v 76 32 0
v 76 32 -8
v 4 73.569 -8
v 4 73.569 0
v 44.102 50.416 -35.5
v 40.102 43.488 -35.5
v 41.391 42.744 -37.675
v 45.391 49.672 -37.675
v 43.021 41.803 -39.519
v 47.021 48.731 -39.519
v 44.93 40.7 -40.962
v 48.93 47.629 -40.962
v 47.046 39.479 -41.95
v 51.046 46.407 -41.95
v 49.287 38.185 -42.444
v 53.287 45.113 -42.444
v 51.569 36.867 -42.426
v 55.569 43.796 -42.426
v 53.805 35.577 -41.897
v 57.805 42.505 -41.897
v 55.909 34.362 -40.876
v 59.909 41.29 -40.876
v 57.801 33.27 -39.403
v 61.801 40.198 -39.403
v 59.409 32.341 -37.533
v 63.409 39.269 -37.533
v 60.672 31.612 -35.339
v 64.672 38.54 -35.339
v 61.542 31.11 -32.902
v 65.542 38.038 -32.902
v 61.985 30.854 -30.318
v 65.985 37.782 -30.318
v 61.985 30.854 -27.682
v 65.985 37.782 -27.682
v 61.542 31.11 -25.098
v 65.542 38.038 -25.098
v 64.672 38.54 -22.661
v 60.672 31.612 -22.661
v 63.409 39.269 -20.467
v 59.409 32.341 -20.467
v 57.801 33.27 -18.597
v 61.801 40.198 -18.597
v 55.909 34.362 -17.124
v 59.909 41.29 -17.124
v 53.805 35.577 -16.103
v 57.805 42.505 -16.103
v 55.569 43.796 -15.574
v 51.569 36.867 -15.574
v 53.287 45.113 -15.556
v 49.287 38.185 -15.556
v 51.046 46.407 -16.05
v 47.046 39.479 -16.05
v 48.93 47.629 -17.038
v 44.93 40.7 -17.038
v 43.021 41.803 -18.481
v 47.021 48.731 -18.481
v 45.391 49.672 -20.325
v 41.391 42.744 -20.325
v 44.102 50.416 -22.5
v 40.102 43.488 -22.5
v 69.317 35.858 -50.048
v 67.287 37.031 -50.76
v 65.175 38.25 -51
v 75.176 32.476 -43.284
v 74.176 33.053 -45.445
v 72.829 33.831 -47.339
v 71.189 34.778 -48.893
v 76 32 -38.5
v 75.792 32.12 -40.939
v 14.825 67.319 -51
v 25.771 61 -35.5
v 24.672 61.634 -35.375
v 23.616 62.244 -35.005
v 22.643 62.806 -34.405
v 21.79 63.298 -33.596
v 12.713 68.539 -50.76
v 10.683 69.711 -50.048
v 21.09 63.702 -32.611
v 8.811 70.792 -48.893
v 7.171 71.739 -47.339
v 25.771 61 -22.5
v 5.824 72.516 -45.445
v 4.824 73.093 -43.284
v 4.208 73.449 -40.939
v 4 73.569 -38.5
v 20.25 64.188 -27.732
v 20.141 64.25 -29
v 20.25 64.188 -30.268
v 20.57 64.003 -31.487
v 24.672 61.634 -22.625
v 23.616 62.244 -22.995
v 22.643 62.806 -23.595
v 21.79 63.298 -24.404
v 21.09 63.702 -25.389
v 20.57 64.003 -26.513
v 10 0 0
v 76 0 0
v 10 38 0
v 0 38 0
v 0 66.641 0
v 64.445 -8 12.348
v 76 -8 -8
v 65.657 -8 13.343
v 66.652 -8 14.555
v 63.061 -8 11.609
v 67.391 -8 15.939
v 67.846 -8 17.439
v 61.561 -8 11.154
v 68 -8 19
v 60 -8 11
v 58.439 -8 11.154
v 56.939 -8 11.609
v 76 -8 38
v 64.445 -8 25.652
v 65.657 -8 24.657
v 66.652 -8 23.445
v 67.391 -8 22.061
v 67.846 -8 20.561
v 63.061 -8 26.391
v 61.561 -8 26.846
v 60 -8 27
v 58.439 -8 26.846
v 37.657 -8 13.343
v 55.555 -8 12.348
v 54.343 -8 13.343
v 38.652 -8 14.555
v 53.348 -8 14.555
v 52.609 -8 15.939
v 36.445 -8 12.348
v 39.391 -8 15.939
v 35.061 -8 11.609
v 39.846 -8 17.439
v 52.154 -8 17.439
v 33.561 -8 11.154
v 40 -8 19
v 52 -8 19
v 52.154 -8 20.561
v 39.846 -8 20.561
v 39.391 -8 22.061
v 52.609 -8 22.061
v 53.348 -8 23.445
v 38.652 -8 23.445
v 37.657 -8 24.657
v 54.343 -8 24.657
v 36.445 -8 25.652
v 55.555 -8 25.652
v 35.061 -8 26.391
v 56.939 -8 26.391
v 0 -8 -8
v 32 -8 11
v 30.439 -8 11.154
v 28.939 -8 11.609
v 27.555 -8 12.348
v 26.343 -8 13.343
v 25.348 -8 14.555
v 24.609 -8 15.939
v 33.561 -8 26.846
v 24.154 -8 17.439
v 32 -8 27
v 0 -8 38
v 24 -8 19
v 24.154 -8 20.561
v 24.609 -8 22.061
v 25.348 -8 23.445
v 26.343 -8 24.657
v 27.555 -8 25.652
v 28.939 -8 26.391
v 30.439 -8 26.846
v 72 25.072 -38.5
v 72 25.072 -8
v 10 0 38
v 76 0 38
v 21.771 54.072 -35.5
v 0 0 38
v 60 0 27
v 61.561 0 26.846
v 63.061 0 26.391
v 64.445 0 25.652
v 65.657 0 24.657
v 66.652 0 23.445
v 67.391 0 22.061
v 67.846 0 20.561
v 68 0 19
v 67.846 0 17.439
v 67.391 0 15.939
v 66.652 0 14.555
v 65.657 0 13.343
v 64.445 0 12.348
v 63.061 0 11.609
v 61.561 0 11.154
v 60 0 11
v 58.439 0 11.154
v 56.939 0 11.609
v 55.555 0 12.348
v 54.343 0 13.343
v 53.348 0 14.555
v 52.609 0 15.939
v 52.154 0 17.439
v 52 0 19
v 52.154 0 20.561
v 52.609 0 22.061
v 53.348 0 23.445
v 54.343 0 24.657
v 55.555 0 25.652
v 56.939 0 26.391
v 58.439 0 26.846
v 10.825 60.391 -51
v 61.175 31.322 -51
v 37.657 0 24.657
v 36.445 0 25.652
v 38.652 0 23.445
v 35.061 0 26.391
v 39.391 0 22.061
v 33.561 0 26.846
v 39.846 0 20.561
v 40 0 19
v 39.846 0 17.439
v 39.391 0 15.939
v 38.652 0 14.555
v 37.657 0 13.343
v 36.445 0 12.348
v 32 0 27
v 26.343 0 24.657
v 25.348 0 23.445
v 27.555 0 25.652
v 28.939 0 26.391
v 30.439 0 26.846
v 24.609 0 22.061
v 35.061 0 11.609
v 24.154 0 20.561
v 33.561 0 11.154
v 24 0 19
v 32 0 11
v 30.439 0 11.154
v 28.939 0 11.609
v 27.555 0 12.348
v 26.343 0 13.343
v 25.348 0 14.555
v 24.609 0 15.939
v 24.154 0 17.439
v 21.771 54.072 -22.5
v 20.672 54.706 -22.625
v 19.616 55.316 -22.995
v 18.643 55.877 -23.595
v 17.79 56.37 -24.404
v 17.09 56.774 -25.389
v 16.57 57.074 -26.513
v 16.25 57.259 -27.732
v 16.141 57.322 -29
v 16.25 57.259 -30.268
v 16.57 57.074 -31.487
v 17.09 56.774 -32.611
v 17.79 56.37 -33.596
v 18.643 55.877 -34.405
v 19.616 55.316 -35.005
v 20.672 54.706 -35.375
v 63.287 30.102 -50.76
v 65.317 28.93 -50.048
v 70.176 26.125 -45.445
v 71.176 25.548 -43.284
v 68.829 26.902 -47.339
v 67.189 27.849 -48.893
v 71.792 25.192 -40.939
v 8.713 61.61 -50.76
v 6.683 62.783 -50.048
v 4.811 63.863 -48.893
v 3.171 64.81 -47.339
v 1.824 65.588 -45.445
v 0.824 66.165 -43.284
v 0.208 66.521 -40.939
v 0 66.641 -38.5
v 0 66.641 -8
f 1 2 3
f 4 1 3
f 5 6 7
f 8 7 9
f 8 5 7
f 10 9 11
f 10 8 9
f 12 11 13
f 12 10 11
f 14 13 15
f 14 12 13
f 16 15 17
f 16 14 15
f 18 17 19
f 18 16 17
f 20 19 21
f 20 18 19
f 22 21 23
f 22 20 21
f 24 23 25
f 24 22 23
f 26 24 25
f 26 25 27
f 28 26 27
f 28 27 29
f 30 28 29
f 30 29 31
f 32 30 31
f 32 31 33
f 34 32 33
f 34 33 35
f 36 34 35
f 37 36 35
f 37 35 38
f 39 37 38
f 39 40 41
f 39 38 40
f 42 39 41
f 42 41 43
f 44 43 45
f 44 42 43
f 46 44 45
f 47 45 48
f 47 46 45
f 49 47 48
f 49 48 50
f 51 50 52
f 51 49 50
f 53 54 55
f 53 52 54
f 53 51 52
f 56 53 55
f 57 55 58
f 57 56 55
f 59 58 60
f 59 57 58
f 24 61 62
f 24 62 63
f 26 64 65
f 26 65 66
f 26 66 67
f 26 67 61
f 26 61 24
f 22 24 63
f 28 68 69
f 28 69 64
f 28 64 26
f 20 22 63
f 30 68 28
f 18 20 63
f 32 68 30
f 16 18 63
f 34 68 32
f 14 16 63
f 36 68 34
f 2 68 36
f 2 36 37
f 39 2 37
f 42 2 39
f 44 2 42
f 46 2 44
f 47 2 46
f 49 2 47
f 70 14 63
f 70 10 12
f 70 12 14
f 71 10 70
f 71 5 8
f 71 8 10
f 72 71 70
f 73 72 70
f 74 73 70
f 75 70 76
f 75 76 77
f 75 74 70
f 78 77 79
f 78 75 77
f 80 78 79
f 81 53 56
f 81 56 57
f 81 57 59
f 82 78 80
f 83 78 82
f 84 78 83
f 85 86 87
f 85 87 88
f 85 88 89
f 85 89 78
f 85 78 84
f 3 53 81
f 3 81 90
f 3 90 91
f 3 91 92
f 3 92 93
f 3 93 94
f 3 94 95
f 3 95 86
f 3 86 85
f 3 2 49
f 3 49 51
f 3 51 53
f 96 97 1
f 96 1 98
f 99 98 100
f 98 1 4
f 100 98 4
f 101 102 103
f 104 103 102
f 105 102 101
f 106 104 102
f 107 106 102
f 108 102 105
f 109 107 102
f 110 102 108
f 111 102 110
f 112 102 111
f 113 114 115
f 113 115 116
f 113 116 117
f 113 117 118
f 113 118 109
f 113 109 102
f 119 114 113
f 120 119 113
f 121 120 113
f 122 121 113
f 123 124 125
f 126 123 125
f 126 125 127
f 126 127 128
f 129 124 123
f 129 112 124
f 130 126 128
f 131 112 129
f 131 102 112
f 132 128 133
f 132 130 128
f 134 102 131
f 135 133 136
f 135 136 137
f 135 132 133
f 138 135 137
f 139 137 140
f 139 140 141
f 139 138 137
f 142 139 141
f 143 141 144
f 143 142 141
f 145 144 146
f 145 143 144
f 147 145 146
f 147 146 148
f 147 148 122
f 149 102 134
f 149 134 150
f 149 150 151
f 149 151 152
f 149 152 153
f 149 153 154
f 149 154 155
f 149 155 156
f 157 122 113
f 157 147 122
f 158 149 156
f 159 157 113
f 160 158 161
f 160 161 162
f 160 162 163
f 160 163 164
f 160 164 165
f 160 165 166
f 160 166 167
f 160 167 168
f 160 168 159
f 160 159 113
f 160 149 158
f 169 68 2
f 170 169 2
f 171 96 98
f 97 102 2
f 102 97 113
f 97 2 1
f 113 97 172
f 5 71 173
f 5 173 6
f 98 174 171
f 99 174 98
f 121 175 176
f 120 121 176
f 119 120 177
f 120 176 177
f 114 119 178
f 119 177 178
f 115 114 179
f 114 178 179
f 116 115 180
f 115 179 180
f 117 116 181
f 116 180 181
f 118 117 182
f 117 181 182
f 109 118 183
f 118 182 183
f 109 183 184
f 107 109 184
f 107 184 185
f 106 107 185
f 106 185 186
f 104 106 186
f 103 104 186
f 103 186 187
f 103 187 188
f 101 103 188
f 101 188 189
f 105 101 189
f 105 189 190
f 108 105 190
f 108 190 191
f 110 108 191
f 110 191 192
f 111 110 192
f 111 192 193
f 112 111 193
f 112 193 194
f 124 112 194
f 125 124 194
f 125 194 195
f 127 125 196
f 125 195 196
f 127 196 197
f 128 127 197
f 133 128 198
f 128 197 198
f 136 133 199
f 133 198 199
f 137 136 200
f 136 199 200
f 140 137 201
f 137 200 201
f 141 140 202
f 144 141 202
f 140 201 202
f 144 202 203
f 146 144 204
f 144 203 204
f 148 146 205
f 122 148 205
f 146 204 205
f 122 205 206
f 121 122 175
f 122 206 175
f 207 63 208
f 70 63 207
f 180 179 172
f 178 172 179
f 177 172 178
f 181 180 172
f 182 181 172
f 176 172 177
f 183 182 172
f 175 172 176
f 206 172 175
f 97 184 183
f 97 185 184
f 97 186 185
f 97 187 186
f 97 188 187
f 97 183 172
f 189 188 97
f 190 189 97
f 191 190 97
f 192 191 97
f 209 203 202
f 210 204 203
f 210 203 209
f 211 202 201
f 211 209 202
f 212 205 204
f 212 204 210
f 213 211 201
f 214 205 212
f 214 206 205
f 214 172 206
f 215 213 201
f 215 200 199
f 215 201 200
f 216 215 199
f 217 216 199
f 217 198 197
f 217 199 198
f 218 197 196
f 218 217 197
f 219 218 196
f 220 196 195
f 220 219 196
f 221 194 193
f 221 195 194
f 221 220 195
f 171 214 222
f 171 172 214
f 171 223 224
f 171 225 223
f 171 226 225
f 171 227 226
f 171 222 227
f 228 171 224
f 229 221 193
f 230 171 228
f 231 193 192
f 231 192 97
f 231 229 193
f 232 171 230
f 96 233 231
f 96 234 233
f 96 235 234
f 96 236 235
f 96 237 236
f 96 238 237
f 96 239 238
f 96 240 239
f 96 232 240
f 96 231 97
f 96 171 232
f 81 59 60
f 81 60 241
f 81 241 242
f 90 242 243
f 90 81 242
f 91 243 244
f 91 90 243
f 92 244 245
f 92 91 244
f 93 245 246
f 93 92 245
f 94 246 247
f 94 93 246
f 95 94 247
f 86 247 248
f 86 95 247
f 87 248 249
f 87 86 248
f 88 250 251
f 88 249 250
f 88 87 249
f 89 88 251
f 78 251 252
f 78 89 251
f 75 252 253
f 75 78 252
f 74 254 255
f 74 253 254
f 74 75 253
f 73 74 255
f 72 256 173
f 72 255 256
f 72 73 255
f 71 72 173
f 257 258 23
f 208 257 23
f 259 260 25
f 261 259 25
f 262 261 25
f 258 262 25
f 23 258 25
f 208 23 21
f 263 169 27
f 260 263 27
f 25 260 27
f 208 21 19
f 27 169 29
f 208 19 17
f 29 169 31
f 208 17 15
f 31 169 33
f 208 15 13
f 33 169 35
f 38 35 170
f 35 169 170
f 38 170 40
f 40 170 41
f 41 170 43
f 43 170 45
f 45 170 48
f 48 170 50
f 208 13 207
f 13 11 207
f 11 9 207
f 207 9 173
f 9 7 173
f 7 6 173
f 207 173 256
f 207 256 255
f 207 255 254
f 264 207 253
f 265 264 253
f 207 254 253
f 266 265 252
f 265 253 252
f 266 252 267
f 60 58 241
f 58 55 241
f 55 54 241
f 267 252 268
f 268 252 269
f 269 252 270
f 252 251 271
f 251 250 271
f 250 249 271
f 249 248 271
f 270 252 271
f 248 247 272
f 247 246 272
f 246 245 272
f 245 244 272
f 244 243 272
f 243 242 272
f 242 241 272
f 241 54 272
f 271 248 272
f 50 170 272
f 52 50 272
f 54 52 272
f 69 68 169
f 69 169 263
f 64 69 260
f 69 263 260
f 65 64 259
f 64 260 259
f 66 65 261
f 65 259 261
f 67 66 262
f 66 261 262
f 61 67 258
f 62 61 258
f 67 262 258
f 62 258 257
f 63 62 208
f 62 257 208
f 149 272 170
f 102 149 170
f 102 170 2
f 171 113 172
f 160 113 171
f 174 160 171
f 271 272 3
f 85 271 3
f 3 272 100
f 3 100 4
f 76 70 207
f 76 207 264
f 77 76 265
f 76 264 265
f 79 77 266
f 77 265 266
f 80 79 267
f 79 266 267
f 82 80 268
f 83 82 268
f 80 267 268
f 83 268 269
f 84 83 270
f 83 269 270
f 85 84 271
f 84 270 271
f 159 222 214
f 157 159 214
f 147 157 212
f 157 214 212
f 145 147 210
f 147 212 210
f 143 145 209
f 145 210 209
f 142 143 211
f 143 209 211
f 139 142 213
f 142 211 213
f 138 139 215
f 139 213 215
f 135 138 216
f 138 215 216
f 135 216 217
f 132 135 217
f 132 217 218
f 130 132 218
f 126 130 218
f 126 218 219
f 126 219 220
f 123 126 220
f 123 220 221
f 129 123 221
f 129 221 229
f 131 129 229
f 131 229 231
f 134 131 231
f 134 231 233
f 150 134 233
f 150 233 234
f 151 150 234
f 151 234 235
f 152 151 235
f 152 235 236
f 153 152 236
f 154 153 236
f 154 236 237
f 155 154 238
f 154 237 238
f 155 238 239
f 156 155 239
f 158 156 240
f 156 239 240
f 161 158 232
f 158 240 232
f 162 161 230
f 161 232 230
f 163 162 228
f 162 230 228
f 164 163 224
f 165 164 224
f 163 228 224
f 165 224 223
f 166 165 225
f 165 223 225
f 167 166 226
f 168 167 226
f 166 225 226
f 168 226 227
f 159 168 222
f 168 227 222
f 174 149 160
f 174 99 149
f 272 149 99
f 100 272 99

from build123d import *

# Parameters (mm, degrees)
BASE_EXTRUDE_THIN_DEPTH = 76
BOSS_EXTRUDE1_START     = -8
BOSS_EXTRUDE1_DEPTH     = 8
SKETCH3_W               = 87.757240917
SKETCH3_H               = 51
BOSS_EXTRUDE2_DEPTH     = 8
CUT_EXTRUDE1_DEPTH      = 119.888876867
FILLET1_R               = 12.5
BOSS_EXTRUDE3_DEPTH     = 10
CUT_EXTRUDE2_DEPTH      = 101.073742043
SKETCH9_R               = 8
CUT_EXTRUDE3_DEPTH      = 118.428403891
LPATTERN2_COUNT         = 2
LPATTERN2_PITCH         = 28


# Read off the part's stored shape, not the designer's step: Boss-Extrude1
with BuildPart() as part:
    # Sketch1 → Base-Extrude-Thin (new body)
    with BuildSketch(Plane(origin=(0, 0, 0), x_dir=(0, 0, -1), z_dir=(1, 0, 0))):
        Polygon((-38, 0), (0, 0), (0, 32), (8, 32), (8, -8), (-38, -8), align=None)
    extrude(amount=BASE_EXTRUDE_THIN_DEPTH)

    # Boss-Extrude1 outline → Boss-Extrude1 (add)
    with BuildSketch(Plane.XY.offset(BOSS_EXTRUDE1_START)):
        Polygon((76, 32), (0, 75.878620458), (0, 32), align=None)
    extrude(amount=BOSS_EXTRUDE1_DEPTH)

    # Sketch3 → Boss-Extrude2 (add)
    with BuildSketch(Plane(origin=(32.856406461, 56.908965344, 0), x_dir=(-0.8660254037844379, 0.5000000000000014, 0), z_dir=(0.5000000000000014, 0.8660254037844379, 0))):
        with Locations((-5.93931023, -25.5)):
            Rectangle(SKETCH3_W, SKETCH3_H)
    extrude(amount=-BOSS_EXTRUDE2_DEPTH)

    # Sketch4 → Cut-Extrude1 (cut, through all)
    with BuildSketch(Plane.XY):
        Polygon((-113.800448301, -130.46714223), (0, 66.641016151), (4, 73.569219382), (117.800448301, 270.677377763), (-276.415868462, 498.278274366), (-508.016765065, 97.133754372), align=None)
    extrude(amount=-CUT_EXTRUDE1_DEPTH, mode=Mode.SUBTRACT)

    # Fillet1
    fillet1_edges = [part.edges().sort_by_distance(p)[0] for p in [
        (74, 28.535898385, -51),
        (2, 70.105117767, -51),
    ]]
    fillet(fillet1_edges, radius=FILLET1_R)

    # Sketch5 → Boss-Extrude3 (add)
    with BuildSketch(Plane.ZY):
        Polygon((0, 38), (0, 0), (38, 0), align=None)
    extrude(amount=-BOSS_EXTRUDE3_DEPTH)

    # Sketch6 → Cut-Extrude2 (cut, through all)
    with BuildSketch(Plane(origin=(24.713169413, 61.610465445, -0.61351416), x_dir=(-0.866025403784438, 0.5000000000000012, 0), z_dir=(0.5000000000000011, 0.8660254037844379, 0))):
        with BuildLine():
            Line((-1.220930891, -34.88648584), (-22.388771324, -34.88648584))
            ThreePointArc((-22.388771324, -34.88648584), (-47.720930891, -28.38648584), (-22.388771324, -21.88648584))
            Line((-22.388771324, -21.88648584), (-1.220930891, -21.88648584))
            ThreePointArc((-1.220930891, -21.88648584), (5.279069109, -28.38648584), (-1.220930891, -34.88648584))
        make_face()
    extrude(amount=-CUT_EXTRUDE2_DEPTH, mode=Mode.SUBTRACT)

    # Sketch9 → Cut-Extrude3 (cut, through all)
    with BuildSketch(Plane(origin=(0, 0, 0), x_dir=(-1, 0, 0), z_dir=(0, 1, 0))):
        with Locations(Location((-60, 19, 0), (0, 0, 90))):
            Circle(SKETCH9_R)
    cut_extrude3 = extrude(amount=-CUT_EXTRUDE3_DEPTH, mode=Mode.SUBTRACT)

    # LPattern2: Cut-Extrude3 ×2
    with Locations(*[(-i * LPATTERN2_PITCH, 0, 0) for i in range(1, LPATTERN2_COUNT)]):
        add(cut_extrude3, mode=Mode.SUBTRACT)


solid = part.part
